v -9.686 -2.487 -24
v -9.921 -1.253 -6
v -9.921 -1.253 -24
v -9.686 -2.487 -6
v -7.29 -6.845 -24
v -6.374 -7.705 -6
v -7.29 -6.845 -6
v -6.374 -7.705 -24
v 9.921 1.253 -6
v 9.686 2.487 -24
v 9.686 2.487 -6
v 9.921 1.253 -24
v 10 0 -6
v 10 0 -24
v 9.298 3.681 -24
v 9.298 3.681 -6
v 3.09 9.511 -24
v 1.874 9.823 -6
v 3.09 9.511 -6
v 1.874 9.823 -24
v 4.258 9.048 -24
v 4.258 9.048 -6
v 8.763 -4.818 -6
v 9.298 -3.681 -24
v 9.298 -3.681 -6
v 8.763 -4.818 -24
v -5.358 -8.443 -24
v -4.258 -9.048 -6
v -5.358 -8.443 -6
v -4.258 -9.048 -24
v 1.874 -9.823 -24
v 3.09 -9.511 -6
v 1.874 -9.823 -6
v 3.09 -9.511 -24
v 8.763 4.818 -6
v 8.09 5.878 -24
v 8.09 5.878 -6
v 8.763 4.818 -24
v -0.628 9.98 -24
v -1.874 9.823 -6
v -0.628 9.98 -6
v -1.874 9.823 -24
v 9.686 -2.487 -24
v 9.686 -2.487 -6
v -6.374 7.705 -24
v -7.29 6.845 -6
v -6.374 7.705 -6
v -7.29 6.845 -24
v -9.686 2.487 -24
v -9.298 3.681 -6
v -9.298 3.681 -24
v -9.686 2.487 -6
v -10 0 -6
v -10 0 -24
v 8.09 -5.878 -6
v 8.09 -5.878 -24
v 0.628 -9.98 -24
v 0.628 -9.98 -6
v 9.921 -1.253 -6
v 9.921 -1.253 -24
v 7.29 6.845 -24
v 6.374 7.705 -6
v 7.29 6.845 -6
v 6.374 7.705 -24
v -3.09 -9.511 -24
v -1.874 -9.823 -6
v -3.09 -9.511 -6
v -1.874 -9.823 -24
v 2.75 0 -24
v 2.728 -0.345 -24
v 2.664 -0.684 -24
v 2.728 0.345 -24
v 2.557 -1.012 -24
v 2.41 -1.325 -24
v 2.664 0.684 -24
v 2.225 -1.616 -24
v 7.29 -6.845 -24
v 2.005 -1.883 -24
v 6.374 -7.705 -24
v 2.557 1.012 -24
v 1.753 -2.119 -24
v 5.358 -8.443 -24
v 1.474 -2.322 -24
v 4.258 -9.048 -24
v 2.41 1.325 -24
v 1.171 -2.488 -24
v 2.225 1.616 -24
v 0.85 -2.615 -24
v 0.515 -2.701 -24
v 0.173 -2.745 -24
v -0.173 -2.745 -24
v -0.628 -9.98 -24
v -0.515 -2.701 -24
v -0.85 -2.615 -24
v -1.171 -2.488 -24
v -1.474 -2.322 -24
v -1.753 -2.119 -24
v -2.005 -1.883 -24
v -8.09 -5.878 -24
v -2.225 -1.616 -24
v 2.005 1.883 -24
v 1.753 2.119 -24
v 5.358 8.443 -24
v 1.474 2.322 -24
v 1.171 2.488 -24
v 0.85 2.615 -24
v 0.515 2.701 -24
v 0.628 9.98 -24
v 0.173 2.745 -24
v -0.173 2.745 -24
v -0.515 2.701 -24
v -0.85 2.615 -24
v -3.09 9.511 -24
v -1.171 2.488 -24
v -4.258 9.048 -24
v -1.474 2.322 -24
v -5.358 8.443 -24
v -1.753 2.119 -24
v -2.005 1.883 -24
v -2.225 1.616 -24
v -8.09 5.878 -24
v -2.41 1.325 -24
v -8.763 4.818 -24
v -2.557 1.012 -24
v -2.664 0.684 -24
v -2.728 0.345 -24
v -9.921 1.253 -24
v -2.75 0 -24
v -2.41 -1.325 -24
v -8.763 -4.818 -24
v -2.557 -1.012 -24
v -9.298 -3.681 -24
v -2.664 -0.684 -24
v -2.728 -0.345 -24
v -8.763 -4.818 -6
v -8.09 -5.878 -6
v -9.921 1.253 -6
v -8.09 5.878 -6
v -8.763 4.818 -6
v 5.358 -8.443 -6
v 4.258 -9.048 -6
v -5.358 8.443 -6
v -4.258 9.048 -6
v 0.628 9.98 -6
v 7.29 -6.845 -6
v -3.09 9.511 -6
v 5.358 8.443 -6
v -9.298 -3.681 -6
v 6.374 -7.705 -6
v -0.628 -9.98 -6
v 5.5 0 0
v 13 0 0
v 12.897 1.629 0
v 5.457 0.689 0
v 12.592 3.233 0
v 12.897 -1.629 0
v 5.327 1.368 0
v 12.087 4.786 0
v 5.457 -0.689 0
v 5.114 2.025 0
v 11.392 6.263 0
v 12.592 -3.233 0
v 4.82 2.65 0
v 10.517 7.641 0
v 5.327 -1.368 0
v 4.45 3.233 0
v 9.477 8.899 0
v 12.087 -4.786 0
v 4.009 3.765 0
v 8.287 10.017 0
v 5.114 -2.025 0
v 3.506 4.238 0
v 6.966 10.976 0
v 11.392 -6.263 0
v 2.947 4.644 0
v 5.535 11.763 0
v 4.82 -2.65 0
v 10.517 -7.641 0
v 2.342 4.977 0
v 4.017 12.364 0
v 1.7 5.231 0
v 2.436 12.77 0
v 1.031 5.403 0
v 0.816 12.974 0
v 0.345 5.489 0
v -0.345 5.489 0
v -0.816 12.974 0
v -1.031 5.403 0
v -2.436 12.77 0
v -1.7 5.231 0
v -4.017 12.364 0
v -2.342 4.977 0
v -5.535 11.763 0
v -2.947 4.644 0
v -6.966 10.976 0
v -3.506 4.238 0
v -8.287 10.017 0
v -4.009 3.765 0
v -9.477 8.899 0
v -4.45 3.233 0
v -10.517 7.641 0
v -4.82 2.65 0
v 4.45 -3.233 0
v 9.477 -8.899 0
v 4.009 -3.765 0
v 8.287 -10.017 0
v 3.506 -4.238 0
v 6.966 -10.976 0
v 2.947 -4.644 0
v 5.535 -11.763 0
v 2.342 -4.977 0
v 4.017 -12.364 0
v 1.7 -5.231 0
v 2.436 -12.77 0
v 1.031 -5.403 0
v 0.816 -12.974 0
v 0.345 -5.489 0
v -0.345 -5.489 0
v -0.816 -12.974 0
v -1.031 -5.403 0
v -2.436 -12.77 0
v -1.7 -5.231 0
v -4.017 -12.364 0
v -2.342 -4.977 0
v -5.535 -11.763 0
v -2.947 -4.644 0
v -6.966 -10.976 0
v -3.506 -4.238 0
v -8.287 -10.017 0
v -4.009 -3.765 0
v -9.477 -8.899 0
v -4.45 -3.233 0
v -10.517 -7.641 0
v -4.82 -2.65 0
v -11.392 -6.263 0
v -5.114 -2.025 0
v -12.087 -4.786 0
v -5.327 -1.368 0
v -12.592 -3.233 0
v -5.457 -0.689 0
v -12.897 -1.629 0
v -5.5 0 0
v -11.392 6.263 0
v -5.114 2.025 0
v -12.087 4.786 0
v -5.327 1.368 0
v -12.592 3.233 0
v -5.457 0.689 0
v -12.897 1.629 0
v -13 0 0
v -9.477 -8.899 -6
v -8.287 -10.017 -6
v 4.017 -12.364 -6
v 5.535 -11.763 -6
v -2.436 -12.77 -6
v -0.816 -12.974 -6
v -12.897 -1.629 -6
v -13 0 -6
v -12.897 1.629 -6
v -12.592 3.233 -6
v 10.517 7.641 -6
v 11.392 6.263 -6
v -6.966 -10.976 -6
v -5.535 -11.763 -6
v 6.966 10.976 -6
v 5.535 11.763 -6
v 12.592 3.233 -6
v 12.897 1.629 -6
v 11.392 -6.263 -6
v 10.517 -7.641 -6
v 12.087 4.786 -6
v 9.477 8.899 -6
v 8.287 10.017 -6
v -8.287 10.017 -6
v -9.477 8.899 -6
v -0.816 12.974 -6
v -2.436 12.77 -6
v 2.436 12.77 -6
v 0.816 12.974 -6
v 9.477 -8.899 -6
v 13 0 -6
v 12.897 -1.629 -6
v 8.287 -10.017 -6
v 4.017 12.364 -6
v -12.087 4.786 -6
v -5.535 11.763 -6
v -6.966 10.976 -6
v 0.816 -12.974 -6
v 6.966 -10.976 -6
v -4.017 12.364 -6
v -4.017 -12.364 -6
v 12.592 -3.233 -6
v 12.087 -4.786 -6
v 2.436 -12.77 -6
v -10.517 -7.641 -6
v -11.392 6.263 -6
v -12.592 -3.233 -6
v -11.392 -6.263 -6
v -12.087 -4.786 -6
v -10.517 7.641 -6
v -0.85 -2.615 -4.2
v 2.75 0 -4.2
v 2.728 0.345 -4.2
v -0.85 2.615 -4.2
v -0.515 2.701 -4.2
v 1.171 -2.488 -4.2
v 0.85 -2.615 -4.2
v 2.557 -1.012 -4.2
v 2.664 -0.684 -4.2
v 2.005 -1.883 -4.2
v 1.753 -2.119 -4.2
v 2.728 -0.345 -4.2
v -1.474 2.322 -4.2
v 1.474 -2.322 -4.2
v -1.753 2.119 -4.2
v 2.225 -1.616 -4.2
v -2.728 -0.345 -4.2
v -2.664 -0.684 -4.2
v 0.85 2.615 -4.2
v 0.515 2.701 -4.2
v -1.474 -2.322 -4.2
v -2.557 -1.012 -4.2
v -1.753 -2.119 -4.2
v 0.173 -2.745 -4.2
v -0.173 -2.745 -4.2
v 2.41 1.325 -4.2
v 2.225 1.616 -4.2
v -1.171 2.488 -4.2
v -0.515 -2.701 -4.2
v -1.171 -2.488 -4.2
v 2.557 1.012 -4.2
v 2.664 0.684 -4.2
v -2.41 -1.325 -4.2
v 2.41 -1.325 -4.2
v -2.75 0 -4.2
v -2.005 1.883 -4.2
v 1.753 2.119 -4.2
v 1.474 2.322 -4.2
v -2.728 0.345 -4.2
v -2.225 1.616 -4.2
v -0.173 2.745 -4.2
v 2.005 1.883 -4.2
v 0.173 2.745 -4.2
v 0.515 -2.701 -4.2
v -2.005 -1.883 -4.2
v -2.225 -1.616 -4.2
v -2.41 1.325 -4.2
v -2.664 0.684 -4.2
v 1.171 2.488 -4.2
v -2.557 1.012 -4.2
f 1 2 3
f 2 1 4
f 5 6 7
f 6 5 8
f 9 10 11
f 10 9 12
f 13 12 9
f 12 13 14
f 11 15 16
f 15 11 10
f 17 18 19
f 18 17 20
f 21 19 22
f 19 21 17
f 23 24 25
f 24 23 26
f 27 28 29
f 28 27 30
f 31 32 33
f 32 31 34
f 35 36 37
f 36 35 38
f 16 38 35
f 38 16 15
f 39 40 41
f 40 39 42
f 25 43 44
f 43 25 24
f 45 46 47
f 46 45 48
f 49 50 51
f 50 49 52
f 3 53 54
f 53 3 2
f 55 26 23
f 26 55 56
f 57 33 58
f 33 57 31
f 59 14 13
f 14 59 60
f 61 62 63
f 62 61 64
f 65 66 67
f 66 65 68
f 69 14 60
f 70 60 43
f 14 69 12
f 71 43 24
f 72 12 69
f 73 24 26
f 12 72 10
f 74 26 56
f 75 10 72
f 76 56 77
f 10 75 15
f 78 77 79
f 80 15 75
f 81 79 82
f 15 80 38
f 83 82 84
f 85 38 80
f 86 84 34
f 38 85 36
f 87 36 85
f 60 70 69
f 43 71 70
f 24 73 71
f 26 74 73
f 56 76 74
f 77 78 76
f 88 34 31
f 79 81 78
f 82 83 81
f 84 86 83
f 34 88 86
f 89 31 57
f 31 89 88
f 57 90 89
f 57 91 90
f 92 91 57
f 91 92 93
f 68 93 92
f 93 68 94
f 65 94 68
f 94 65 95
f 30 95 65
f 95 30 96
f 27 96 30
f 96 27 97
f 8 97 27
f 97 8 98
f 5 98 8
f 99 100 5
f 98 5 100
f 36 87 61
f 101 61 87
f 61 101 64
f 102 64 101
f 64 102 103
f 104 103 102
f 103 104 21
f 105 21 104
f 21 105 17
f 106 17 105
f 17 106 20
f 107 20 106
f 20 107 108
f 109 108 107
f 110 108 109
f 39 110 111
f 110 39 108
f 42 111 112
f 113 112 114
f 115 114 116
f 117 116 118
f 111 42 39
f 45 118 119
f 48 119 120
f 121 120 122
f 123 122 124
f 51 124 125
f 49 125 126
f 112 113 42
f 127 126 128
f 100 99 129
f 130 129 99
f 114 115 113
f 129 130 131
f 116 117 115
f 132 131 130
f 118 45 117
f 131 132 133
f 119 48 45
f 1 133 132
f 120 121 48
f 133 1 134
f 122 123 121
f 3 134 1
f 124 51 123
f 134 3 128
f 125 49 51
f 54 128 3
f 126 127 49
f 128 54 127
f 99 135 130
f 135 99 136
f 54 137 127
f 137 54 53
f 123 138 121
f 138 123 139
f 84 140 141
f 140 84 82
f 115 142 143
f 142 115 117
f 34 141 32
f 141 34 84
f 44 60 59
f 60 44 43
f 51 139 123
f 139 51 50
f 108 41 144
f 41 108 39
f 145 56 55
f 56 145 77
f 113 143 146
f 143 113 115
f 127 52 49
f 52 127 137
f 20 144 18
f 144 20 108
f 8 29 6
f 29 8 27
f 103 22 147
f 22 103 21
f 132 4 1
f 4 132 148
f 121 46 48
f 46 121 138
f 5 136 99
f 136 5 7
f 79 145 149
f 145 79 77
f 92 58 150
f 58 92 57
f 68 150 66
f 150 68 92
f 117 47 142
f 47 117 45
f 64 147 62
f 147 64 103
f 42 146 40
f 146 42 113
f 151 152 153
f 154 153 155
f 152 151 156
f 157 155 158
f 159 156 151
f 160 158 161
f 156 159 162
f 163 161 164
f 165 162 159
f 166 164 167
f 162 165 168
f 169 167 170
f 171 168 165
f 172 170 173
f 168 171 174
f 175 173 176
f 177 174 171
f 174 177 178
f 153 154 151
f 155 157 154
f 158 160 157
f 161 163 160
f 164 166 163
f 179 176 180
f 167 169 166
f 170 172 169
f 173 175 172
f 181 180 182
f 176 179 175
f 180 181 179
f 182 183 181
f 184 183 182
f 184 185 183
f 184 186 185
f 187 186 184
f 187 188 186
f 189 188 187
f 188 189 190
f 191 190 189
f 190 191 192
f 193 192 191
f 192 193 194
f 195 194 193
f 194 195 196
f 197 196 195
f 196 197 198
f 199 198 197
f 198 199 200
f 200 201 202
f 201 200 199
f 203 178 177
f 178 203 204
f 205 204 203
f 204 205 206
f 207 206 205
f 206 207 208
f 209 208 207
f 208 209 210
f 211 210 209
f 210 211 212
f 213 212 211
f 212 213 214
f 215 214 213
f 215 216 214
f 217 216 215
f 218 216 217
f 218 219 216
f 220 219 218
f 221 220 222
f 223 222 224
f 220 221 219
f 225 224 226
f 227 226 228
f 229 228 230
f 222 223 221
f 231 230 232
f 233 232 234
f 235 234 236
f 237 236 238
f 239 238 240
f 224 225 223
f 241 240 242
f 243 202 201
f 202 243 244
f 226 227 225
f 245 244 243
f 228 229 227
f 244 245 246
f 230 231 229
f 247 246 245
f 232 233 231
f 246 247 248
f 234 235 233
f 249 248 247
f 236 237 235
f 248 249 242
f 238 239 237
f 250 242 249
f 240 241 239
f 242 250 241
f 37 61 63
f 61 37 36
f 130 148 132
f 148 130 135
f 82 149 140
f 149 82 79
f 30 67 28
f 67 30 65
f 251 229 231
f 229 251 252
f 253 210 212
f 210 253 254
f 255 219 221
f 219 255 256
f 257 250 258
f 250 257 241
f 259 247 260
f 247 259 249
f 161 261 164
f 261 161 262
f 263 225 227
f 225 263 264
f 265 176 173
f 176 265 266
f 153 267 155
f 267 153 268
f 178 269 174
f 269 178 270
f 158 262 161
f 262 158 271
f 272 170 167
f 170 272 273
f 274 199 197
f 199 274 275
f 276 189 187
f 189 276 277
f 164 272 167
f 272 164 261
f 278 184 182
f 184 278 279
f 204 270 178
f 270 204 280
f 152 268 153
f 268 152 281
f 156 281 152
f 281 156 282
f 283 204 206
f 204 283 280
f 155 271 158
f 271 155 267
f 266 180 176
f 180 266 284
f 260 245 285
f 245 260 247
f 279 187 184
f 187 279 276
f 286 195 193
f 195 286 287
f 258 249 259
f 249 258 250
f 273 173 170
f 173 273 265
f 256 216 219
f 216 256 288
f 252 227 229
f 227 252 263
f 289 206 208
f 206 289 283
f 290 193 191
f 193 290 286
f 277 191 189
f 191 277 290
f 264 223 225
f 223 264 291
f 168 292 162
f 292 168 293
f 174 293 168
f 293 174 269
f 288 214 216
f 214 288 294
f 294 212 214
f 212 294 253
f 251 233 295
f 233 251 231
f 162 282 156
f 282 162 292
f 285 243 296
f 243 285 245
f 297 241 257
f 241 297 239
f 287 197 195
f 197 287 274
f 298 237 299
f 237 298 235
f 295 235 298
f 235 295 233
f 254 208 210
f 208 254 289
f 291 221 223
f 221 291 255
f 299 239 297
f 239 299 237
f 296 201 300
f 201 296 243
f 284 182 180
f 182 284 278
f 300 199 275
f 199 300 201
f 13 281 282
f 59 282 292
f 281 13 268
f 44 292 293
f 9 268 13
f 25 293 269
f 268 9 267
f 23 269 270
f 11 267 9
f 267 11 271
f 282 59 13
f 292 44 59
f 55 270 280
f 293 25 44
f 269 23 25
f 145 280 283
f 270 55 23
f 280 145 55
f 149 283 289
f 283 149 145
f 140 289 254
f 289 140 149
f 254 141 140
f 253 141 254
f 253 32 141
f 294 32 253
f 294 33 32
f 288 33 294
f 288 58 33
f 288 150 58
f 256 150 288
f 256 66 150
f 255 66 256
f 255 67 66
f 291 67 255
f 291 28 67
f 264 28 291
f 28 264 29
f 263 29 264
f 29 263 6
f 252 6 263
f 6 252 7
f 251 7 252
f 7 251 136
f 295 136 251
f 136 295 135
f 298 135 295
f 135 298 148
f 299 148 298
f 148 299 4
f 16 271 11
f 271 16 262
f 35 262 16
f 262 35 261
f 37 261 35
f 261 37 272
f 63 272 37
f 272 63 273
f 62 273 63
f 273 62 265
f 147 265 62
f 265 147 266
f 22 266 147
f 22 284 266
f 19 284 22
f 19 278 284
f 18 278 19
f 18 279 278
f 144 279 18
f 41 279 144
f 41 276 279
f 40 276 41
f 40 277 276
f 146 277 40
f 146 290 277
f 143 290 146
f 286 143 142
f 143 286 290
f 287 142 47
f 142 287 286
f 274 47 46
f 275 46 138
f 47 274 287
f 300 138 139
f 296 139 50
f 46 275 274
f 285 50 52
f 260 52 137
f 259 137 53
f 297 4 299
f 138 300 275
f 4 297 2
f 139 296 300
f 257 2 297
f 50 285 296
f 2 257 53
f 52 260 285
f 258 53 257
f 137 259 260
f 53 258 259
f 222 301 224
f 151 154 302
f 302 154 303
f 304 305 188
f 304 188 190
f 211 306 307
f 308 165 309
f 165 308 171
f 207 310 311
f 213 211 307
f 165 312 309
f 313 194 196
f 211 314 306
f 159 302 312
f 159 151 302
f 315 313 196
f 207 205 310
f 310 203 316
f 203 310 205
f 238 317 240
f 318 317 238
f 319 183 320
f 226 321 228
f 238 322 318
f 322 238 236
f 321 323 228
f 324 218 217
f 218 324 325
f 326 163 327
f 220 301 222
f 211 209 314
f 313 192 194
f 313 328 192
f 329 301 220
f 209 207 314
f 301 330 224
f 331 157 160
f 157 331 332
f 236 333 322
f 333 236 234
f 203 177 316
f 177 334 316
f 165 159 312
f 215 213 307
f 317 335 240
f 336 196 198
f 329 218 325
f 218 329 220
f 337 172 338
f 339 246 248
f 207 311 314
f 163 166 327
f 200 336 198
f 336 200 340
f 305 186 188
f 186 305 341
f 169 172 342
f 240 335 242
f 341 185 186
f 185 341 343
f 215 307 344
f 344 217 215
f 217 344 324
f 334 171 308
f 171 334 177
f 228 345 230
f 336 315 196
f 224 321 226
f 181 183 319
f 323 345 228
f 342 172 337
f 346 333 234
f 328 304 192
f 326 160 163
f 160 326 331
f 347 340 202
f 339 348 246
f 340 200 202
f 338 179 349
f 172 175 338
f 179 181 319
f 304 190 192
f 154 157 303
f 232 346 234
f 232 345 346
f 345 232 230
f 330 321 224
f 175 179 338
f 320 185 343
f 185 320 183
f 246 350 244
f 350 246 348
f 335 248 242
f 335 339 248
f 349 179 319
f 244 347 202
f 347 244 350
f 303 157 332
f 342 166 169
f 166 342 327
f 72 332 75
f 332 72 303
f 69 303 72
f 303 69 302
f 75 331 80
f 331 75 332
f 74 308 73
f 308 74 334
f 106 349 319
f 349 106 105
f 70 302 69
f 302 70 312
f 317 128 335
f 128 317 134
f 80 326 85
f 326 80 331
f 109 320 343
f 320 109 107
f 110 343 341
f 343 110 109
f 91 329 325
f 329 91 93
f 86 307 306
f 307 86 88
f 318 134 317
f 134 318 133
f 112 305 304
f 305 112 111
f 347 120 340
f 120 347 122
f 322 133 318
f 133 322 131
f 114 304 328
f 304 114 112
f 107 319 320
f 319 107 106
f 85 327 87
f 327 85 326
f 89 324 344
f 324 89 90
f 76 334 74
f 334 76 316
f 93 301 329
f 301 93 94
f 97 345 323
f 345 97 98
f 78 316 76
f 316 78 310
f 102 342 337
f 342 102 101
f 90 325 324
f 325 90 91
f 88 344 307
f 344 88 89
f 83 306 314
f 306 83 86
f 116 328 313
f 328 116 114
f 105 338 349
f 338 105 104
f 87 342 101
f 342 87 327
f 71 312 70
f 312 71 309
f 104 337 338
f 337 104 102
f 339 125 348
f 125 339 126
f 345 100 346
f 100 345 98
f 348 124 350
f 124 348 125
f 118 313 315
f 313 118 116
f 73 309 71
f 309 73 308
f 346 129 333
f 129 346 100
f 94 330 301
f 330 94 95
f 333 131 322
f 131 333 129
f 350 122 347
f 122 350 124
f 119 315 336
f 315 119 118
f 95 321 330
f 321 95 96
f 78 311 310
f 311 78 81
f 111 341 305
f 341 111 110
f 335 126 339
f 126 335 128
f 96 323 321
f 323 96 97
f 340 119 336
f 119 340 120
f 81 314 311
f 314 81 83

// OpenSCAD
$fn = 50;


difference() {
	union() {
		translate(v = [0, 0, -24.0000000000]) {
			cylinder(h = 24, r = 10.0000000000);
		}
		translate(v = [0, 0, -6.0000000000]) {
			cylinder(h = 6, r = 13.0000000000);
		}
	}
	union() {
		translate(v = [0, 0, 0]) {
			rotate(a = [0, 0, 0]) {
				difference() {
					union() {
						#translate(v = [0, 0, -24.0000000000]) {
							cylinder(h = 24, r = 2.2500000000);
						}
						#translate(v = [0, 0, -4.2000000000]) {
							cylinder(h = 4.2000000000, r1 = 2.7500000000, r2 = 5.5000000000);
						}
						#translate(v = [0, 0, -24.0000000000]) {
							cylinder(h = 24, r = 2.7500000000);
						}
						#translate(v = [0, 0, -24.0000000000]) {
							cylinder(h = 24, r = 2.2500000000);
						}
					}
					union();
				}
			}
		}
	}
}
